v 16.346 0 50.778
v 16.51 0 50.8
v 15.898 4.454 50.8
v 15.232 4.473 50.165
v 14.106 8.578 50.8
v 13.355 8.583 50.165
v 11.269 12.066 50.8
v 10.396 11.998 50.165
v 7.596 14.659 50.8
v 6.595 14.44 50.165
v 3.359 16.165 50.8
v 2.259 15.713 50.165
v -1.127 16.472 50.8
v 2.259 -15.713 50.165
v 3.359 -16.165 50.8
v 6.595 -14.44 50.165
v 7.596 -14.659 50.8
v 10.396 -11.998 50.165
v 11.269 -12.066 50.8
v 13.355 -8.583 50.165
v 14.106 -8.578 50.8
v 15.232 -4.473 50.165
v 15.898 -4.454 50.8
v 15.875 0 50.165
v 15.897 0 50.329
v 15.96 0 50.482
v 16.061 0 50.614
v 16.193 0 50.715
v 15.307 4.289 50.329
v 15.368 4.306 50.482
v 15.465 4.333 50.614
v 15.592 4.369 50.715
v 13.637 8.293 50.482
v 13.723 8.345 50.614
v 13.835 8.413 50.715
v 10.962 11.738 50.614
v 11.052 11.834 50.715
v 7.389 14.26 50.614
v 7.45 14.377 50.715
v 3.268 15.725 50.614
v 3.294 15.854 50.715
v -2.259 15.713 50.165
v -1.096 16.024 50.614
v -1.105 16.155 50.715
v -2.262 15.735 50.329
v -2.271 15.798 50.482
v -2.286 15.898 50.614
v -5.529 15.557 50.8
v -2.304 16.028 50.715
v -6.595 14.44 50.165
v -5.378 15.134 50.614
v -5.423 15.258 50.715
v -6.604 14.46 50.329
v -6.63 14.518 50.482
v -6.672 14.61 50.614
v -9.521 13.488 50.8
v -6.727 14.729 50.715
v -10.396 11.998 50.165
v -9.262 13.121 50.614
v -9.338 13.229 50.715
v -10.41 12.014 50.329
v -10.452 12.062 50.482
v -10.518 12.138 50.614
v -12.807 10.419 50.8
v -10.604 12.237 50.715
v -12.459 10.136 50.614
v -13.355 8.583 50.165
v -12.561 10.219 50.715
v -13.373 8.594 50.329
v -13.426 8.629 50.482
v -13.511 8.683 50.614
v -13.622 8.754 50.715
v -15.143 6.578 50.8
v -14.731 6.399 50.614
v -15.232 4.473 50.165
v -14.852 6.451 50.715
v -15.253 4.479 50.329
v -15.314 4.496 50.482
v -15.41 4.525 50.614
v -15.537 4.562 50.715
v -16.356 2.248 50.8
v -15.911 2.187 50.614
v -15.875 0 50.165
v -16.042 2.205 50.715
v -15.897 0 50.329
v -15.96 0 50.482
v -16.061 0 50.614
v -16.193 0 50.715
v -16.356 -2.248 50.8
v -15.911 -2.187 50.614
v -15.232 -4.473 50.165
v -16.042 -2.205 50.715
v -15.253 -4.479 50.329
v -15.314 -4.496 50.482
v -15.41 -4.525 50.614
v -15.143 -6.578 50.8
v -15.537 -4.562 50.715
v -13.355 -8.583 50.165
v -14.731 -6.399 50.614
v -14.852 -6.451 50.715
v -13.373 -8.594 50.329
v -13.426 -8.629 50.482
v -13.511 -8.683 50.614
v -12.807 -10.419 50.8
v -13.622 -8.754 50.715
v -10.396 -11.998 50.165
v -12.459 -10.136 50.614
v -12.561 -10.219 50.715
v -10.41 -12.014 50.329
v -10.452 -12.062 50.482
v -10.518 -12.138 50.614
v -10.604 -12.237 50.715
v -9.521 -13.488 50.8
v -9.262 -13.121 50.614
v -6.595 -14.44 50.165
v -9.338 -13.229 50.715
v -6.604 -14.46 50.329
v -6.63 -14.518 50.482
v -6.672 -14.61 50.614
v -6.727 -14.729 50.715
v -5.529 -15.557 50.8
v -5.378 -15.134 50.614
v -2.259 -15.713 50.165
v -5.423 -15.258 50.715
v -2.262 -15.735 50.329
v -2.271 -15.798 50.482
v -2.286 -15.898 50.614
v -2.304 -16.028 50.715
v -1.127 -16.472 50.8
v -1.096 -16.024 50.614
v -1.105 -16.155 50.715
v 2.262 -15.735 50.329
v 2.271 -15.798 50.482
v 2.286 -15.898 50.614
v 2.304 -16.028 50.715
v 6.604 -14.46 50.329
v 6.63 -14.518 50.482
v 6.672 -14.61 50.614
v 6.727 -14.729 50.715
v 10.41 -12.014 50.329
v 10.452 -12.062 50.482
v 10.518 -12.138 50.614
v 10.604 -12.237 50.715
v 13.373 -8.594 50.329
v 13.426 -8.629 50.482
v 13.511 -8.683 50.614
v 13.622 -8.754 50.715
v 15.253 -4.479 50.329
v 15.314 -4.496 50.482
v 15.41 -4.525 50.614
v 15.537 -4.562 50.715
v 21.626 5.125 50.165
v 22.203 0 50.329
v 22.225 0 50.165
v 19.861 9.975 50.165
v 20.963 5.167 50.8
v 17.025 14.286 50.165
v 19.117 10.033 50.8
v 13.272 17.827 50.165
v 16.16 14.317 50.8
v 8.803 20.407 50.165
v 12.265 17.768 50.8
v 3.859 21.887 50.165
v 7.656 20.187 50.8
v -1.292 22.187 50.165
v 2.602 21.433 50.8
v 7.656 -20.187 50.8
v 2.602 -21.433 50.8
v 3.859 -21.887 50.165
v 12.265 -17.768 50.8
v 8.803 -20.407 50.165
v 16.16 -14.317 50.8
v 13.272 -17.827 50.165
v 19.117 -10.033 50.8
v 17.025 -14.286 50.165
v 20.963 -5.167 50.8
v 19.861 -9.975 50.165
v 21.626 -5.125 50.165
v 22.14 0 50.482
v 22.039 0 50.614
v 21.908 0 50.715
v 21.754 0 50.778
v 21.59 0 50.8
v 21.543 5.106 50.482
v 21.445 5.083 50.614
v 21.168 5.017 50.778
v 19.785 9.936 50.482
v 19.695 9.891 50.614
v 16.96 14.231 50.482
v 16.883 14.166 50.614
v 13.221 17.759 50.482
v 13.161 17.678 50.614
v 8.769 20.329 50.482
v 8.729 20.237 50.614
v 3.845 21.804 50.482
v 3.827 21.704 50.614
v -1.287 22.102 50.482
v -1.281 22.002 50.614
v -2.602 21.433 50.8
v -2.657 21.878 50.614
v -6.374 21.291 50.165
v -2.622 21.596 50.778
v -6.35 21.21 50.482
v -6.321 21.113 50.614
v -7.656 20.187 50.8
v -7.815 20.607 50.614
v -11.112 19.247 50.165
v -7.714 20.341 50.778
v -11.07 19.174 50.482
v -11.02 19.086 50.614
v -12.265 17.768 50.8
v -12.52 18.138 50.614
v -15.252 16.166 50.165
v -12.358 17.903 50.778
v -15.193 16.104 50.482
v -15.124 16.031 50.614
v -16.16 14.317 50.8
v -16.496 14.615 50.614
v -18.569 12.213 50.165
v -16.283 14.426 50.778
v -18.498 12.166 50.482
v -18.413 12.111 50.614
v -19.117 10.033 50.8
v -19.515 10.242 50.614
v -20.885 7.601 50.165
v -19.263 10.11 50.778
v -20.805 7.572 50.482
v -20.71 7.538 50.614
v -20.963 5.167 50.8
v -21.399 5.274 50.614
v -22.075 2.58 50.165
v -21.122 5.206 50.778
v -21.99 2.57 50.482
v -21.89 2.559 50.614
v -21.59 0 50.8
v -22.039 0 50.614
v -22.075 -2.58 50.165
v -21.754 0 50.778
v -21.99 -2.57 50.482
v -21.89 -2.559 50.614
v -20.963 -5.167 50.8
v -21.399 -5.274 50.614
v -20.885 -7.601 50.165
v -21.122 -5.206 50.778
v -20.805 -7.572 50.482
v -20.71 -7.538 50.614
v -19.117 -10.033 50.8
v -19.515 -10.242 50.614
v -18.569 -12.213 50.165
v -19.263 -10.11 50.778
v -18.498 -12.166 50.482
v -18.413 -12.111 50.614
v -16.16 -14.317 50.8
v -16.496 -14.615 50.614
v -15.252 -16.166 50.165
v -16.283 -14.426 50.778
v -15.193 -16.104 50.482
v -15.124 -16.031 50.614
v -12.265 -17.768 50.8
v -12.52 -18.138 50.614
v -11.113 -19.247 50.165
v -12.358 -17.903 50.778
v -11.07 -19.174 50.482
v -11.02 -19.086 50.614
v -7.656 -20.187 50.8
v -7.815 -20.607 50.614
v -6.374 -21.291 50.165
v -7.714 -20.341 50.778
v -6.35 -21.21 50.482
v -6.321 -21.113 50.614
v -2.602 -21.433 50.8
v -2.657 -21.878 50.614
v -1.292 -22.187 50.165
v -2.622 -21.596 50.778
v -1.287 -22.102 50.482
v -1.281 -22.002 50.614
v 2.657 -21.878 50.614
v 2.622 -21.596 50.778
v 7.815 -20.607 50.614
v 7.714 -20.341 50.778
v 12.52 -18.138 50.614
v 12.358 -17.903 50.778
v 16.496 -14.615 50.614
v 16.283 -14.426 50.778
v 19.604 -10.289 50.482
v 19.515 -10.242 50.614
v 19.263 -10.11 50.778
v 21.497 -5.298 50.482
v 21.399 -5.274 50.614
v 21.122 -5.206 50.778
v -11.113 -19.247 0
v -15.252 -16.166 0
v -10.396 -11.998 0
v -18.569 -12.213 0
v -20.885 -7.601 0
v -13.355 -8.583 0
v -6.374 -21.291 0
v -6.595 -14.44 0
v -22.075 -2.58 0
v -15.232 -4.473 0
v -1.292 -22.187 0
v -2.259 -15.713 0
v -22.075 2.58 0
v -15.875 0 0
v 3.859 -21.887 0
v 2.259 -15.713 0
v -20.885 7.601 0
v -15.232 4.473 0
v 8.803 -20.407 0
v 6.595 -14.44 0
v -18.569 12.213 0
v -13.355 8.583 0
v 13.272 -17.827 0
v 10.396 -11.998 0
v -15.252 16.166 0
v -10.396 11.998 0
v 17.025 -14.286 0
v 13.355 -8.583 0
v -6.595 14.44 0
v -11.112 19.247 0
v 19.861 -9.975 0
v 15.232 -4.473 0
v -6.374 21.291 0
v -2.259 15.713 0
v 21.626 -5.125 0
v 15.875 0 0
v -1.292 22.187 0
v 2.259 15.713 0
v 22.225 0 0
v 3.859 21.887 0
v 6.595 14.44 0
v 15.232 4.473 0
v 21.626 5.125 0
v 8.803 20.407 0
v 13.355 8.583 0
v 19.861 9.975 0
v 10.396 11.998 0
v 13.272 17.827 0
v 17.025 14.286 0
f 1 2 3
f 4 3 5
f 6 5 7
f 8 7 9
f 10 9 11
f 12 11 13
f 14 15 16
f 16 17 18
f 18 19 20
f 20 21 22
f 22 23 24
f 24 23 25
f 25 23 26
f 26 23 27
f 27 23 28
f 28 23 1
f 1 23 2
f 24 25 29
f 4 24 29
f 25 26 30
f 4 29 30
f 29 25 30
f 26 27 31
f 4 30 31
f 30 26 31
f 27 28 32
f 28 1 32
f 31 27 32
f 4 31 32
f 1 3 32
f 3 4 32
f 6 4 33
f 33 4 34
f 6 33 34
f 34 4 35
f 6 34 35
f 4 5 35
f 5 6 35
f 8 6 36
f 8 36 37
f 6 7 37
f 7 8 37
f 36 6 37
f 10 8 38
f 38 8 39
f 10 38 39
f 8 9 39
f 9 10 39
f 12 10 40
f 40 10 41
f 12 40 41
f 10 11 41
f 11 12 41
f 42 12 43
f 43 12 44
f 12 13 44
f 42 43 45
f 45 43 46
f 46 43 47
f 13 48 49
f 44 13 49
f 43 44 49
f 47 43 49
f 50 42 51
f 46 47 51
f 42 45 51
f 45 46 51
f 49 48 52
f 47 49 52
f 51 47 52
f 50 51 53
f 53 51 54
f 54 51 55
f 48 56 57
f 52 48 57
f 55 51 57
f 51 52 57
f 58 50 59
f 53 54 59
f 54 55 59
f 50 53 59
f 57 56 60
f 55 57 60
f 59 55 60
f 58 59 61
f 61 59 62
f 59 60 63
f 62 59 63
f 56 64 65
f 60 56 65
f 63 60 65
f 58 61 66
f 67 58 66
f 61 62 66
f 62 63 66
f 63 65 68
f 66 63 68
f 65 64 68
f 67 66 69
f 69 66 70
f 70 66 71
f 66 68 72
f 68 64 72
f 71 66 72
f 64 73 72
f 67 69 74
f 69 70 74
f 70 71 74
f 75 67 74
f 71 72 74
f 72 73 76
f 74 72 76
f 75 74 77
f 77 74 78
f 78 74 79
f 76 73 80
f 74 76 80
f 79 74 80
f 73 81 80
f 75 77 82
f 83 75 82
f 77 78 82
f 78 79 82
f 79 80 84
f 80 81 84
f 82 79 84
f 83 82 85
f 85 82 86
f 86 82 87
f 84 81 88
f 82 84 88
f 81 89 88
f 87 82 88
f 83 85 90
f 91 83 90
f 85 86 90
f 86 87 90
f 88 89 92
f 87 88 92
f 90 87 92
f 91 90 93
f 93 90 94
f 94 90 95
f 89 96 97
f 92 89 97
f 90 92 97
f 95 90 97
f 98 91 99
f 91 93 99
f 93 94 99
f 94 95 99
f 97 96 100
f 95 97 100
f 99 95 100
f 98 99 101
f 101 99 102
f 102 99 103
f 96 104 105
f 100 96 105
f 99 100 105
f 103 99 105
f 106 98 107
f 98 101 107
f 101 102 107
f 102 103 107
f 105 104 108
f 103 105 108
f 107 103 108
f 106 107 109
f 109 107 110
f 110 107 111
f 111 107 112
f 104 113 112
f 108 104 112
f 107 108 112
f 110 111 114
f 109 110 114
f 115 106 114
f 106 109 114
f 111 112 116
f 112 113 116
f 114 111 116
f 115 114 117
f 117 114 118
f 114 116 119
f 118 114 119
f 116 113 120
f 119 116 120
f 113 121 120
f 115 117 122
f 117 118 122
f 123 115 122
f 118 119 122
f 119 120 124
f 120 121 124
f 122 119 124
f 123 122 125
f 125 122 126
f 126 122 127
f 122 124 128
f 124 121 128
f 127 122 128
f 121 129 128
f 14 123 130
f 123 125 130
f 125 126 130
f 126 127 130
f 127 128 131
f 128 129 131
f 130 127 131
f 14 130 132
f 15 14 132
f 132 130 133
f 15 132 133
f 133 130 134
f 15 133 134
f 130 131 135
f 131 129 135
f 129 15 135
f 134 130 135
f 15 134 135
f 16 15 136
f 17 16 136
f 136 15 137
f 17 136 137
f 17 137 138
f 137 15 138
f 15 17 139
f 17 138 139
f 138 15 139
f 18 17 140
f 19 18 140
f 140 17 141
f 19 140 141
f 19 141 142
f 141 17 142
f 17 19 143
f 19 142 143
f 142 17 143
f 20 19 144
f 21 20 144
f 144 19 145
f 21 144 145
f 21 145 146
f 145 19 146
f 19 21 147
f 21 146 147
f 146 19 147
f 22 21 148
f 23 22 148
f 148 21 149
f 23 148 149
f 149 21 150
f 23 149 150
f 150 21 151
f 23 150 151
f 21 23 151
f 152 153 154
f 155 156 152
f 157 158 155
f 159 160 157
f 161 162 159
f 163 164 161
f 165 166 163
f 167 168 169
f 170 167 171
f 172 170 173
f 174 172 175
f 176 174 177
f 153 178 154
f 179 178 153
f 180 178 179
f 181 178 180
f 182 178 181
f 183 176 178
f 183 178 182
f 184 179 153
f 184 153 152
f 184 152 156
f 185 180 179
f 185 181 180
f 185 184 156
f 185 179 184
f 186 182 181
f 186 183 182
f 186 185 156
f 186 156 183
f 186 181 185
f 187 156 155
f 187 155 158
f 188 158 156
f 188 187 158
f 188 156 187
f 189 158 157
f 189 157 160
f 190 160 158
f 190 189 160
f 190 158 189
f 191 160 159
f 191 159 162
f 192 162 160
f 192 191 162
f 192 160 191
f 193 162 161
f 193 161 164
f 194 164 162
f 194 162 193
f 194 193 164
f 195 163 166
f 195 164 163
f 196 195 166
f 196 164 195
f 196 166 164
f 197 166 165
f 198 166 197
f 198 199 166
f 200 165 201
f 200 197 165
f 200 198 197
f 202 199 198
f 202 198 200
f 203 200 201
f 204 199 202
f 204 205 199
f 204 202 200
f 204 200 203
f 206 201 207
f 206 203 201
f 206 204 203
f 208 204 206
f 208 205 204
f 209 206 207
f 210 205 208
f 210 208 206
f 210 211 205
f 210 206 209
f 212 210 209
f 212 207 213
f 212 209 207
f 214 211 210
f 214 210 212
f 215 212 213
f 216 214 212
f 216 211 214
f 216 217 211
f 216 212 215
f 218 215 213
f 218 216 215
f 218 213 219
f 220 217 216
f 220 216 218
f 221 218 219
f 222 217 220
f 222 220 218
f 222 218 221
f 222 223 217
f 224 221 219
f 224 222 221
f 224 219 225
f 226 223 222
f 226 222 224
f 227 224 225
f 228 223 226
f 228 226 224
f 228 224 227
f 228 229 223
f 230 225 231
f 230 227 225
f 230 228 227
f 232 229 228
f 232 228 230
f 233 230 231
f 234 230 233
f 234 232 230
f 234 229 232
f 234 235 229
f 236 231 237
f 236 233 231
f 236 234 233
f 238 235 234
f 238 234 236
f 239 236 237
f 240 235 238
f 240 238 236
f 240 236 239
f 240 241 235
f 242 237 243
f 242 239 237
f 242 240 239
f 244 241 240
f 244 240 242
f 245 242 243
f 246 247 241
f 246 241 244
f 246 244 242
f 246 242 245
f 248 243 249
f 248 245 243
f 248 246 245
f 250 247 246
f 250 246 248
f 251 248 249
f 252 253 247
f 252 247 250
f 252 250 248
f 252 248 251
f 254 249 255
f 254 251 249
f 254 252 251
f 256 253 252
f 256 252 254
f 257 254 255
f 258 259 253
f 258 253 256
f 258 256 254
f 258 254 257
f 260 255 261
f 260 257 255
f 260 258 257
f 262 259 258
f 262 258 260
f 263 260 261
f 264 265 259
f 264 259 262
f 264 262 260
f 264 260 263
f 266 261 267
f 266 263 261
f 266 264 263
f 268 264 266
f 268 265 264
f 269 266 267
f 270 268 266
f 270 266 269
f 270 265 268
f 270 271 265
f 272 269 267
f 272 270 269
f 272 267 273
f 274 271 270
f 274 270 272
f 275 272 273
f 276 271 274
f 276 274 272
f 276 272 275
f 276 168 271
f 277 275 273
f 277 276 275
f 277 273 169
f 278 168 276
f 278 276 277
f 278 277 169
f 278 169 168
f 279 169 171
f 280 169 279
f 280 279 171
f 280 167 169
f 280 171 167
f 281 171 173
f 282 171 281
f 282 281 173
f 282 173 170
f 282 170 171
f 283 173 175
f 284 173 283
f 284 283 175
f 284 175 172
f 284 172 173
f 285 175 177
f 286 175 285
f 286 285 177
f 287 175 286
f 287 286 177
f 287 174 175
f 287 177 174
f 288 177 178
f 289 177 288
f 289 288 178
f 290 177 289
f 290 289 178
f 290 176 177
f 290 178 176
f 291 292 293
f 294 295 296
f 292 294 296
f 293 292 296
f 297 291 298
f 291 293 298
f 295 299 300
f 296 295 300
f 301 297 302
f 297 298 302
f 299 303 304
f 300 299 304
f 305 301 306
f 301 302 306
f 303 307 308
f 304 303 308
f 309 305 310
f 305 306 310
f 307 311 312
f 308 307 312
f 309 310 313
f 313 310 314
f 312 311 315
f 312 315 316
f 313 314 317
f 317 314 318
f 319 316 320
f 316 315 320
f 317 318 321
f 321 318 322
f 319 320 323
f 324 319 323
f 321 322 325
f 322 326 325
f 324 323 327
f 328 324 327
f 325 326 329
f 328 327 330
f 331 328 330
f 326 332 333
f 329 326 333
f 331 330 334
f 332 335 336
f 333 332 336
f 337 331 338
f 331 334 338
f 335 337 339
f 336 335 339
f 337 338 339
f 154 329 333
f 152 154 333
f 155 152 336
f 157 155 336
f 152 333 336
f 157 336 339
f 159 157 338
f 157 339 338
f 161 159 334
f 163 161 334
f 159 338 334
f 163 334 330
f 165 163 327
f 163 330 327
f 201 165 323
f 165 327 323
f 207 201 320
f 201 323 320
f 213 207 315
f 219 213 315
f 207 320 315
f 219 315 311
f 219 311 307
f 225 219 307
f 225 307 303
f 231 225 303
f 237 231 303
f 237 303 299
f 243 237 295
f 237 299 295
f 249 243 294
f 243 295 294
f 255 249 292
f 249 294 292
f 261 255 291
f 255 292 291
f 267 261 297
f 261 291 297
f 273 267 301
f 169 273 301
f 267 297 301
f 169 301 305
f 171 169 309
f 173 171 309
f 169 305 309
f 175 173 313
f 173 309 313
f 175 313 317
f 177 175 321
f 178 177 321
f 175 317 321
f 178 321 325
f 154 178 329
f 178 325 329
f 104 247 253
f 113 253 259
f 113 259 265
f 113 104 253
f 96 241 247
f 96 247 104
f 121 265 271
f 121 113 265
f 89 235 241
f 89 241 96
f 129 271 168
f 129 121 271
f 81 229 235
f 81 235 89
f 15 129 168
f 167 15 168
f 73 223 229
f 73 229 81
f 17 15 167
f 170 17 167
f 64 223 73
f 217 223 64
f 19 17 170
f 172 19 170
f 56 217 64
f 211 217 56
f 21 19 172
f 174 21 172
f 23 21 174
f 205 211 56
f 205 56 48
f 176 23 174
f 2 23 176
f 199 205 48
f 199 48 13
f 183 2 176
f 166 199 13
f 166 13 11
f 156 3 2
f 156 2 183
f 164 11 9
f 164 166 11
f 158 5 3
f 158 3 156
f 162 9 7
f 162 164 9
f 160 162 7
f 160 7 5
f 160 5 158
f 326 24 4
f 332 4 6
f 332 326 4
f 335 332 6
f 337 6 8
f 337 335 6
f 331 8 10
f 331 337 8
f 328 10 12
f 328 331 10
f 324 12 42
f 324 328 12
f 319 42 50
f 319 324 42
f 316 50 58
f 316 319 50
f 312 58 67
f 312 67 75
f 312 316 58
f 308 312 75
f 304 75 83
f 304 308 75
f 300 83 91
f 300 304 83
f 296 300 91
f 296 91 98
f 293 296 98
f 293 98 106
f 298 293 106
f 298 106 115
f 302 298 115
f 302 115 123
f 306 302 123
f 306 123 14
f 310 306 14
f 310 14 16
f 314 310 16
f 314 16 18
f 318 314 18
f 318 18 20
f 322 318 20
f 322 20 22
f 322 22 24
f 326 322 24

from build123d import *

# Parameters (mm, degrees)
F0_R     = 22.225
F1_DEPTH = 50.8
F2_T     = -6.35
F3_R     = 0.635


with BuildPart() as f1:
    # F0 (on Top) → F1 (new body)
    with BuildSketch(Plane.XY):
        Circle(F0_R)
    extrude(amount=F1_DEPTH)

    # F2
    f2_openings = [f1.faces().sort_by_distance(p)[0] for p in [
        (0, 0, 50.8),
        (0, 0, 0),
    ]]
    offset(amount=F2_T, openings=f2_openings)

    # F3
    f3_edges = [f1.edges().sort_by_distance(p)[0] for p in [
        (-22.225, 0, 50.8),
        (-15.875, 0, 50.8),
    ]]
    fillet(f3_edges, radius=F3_R)


solid = f1.part
